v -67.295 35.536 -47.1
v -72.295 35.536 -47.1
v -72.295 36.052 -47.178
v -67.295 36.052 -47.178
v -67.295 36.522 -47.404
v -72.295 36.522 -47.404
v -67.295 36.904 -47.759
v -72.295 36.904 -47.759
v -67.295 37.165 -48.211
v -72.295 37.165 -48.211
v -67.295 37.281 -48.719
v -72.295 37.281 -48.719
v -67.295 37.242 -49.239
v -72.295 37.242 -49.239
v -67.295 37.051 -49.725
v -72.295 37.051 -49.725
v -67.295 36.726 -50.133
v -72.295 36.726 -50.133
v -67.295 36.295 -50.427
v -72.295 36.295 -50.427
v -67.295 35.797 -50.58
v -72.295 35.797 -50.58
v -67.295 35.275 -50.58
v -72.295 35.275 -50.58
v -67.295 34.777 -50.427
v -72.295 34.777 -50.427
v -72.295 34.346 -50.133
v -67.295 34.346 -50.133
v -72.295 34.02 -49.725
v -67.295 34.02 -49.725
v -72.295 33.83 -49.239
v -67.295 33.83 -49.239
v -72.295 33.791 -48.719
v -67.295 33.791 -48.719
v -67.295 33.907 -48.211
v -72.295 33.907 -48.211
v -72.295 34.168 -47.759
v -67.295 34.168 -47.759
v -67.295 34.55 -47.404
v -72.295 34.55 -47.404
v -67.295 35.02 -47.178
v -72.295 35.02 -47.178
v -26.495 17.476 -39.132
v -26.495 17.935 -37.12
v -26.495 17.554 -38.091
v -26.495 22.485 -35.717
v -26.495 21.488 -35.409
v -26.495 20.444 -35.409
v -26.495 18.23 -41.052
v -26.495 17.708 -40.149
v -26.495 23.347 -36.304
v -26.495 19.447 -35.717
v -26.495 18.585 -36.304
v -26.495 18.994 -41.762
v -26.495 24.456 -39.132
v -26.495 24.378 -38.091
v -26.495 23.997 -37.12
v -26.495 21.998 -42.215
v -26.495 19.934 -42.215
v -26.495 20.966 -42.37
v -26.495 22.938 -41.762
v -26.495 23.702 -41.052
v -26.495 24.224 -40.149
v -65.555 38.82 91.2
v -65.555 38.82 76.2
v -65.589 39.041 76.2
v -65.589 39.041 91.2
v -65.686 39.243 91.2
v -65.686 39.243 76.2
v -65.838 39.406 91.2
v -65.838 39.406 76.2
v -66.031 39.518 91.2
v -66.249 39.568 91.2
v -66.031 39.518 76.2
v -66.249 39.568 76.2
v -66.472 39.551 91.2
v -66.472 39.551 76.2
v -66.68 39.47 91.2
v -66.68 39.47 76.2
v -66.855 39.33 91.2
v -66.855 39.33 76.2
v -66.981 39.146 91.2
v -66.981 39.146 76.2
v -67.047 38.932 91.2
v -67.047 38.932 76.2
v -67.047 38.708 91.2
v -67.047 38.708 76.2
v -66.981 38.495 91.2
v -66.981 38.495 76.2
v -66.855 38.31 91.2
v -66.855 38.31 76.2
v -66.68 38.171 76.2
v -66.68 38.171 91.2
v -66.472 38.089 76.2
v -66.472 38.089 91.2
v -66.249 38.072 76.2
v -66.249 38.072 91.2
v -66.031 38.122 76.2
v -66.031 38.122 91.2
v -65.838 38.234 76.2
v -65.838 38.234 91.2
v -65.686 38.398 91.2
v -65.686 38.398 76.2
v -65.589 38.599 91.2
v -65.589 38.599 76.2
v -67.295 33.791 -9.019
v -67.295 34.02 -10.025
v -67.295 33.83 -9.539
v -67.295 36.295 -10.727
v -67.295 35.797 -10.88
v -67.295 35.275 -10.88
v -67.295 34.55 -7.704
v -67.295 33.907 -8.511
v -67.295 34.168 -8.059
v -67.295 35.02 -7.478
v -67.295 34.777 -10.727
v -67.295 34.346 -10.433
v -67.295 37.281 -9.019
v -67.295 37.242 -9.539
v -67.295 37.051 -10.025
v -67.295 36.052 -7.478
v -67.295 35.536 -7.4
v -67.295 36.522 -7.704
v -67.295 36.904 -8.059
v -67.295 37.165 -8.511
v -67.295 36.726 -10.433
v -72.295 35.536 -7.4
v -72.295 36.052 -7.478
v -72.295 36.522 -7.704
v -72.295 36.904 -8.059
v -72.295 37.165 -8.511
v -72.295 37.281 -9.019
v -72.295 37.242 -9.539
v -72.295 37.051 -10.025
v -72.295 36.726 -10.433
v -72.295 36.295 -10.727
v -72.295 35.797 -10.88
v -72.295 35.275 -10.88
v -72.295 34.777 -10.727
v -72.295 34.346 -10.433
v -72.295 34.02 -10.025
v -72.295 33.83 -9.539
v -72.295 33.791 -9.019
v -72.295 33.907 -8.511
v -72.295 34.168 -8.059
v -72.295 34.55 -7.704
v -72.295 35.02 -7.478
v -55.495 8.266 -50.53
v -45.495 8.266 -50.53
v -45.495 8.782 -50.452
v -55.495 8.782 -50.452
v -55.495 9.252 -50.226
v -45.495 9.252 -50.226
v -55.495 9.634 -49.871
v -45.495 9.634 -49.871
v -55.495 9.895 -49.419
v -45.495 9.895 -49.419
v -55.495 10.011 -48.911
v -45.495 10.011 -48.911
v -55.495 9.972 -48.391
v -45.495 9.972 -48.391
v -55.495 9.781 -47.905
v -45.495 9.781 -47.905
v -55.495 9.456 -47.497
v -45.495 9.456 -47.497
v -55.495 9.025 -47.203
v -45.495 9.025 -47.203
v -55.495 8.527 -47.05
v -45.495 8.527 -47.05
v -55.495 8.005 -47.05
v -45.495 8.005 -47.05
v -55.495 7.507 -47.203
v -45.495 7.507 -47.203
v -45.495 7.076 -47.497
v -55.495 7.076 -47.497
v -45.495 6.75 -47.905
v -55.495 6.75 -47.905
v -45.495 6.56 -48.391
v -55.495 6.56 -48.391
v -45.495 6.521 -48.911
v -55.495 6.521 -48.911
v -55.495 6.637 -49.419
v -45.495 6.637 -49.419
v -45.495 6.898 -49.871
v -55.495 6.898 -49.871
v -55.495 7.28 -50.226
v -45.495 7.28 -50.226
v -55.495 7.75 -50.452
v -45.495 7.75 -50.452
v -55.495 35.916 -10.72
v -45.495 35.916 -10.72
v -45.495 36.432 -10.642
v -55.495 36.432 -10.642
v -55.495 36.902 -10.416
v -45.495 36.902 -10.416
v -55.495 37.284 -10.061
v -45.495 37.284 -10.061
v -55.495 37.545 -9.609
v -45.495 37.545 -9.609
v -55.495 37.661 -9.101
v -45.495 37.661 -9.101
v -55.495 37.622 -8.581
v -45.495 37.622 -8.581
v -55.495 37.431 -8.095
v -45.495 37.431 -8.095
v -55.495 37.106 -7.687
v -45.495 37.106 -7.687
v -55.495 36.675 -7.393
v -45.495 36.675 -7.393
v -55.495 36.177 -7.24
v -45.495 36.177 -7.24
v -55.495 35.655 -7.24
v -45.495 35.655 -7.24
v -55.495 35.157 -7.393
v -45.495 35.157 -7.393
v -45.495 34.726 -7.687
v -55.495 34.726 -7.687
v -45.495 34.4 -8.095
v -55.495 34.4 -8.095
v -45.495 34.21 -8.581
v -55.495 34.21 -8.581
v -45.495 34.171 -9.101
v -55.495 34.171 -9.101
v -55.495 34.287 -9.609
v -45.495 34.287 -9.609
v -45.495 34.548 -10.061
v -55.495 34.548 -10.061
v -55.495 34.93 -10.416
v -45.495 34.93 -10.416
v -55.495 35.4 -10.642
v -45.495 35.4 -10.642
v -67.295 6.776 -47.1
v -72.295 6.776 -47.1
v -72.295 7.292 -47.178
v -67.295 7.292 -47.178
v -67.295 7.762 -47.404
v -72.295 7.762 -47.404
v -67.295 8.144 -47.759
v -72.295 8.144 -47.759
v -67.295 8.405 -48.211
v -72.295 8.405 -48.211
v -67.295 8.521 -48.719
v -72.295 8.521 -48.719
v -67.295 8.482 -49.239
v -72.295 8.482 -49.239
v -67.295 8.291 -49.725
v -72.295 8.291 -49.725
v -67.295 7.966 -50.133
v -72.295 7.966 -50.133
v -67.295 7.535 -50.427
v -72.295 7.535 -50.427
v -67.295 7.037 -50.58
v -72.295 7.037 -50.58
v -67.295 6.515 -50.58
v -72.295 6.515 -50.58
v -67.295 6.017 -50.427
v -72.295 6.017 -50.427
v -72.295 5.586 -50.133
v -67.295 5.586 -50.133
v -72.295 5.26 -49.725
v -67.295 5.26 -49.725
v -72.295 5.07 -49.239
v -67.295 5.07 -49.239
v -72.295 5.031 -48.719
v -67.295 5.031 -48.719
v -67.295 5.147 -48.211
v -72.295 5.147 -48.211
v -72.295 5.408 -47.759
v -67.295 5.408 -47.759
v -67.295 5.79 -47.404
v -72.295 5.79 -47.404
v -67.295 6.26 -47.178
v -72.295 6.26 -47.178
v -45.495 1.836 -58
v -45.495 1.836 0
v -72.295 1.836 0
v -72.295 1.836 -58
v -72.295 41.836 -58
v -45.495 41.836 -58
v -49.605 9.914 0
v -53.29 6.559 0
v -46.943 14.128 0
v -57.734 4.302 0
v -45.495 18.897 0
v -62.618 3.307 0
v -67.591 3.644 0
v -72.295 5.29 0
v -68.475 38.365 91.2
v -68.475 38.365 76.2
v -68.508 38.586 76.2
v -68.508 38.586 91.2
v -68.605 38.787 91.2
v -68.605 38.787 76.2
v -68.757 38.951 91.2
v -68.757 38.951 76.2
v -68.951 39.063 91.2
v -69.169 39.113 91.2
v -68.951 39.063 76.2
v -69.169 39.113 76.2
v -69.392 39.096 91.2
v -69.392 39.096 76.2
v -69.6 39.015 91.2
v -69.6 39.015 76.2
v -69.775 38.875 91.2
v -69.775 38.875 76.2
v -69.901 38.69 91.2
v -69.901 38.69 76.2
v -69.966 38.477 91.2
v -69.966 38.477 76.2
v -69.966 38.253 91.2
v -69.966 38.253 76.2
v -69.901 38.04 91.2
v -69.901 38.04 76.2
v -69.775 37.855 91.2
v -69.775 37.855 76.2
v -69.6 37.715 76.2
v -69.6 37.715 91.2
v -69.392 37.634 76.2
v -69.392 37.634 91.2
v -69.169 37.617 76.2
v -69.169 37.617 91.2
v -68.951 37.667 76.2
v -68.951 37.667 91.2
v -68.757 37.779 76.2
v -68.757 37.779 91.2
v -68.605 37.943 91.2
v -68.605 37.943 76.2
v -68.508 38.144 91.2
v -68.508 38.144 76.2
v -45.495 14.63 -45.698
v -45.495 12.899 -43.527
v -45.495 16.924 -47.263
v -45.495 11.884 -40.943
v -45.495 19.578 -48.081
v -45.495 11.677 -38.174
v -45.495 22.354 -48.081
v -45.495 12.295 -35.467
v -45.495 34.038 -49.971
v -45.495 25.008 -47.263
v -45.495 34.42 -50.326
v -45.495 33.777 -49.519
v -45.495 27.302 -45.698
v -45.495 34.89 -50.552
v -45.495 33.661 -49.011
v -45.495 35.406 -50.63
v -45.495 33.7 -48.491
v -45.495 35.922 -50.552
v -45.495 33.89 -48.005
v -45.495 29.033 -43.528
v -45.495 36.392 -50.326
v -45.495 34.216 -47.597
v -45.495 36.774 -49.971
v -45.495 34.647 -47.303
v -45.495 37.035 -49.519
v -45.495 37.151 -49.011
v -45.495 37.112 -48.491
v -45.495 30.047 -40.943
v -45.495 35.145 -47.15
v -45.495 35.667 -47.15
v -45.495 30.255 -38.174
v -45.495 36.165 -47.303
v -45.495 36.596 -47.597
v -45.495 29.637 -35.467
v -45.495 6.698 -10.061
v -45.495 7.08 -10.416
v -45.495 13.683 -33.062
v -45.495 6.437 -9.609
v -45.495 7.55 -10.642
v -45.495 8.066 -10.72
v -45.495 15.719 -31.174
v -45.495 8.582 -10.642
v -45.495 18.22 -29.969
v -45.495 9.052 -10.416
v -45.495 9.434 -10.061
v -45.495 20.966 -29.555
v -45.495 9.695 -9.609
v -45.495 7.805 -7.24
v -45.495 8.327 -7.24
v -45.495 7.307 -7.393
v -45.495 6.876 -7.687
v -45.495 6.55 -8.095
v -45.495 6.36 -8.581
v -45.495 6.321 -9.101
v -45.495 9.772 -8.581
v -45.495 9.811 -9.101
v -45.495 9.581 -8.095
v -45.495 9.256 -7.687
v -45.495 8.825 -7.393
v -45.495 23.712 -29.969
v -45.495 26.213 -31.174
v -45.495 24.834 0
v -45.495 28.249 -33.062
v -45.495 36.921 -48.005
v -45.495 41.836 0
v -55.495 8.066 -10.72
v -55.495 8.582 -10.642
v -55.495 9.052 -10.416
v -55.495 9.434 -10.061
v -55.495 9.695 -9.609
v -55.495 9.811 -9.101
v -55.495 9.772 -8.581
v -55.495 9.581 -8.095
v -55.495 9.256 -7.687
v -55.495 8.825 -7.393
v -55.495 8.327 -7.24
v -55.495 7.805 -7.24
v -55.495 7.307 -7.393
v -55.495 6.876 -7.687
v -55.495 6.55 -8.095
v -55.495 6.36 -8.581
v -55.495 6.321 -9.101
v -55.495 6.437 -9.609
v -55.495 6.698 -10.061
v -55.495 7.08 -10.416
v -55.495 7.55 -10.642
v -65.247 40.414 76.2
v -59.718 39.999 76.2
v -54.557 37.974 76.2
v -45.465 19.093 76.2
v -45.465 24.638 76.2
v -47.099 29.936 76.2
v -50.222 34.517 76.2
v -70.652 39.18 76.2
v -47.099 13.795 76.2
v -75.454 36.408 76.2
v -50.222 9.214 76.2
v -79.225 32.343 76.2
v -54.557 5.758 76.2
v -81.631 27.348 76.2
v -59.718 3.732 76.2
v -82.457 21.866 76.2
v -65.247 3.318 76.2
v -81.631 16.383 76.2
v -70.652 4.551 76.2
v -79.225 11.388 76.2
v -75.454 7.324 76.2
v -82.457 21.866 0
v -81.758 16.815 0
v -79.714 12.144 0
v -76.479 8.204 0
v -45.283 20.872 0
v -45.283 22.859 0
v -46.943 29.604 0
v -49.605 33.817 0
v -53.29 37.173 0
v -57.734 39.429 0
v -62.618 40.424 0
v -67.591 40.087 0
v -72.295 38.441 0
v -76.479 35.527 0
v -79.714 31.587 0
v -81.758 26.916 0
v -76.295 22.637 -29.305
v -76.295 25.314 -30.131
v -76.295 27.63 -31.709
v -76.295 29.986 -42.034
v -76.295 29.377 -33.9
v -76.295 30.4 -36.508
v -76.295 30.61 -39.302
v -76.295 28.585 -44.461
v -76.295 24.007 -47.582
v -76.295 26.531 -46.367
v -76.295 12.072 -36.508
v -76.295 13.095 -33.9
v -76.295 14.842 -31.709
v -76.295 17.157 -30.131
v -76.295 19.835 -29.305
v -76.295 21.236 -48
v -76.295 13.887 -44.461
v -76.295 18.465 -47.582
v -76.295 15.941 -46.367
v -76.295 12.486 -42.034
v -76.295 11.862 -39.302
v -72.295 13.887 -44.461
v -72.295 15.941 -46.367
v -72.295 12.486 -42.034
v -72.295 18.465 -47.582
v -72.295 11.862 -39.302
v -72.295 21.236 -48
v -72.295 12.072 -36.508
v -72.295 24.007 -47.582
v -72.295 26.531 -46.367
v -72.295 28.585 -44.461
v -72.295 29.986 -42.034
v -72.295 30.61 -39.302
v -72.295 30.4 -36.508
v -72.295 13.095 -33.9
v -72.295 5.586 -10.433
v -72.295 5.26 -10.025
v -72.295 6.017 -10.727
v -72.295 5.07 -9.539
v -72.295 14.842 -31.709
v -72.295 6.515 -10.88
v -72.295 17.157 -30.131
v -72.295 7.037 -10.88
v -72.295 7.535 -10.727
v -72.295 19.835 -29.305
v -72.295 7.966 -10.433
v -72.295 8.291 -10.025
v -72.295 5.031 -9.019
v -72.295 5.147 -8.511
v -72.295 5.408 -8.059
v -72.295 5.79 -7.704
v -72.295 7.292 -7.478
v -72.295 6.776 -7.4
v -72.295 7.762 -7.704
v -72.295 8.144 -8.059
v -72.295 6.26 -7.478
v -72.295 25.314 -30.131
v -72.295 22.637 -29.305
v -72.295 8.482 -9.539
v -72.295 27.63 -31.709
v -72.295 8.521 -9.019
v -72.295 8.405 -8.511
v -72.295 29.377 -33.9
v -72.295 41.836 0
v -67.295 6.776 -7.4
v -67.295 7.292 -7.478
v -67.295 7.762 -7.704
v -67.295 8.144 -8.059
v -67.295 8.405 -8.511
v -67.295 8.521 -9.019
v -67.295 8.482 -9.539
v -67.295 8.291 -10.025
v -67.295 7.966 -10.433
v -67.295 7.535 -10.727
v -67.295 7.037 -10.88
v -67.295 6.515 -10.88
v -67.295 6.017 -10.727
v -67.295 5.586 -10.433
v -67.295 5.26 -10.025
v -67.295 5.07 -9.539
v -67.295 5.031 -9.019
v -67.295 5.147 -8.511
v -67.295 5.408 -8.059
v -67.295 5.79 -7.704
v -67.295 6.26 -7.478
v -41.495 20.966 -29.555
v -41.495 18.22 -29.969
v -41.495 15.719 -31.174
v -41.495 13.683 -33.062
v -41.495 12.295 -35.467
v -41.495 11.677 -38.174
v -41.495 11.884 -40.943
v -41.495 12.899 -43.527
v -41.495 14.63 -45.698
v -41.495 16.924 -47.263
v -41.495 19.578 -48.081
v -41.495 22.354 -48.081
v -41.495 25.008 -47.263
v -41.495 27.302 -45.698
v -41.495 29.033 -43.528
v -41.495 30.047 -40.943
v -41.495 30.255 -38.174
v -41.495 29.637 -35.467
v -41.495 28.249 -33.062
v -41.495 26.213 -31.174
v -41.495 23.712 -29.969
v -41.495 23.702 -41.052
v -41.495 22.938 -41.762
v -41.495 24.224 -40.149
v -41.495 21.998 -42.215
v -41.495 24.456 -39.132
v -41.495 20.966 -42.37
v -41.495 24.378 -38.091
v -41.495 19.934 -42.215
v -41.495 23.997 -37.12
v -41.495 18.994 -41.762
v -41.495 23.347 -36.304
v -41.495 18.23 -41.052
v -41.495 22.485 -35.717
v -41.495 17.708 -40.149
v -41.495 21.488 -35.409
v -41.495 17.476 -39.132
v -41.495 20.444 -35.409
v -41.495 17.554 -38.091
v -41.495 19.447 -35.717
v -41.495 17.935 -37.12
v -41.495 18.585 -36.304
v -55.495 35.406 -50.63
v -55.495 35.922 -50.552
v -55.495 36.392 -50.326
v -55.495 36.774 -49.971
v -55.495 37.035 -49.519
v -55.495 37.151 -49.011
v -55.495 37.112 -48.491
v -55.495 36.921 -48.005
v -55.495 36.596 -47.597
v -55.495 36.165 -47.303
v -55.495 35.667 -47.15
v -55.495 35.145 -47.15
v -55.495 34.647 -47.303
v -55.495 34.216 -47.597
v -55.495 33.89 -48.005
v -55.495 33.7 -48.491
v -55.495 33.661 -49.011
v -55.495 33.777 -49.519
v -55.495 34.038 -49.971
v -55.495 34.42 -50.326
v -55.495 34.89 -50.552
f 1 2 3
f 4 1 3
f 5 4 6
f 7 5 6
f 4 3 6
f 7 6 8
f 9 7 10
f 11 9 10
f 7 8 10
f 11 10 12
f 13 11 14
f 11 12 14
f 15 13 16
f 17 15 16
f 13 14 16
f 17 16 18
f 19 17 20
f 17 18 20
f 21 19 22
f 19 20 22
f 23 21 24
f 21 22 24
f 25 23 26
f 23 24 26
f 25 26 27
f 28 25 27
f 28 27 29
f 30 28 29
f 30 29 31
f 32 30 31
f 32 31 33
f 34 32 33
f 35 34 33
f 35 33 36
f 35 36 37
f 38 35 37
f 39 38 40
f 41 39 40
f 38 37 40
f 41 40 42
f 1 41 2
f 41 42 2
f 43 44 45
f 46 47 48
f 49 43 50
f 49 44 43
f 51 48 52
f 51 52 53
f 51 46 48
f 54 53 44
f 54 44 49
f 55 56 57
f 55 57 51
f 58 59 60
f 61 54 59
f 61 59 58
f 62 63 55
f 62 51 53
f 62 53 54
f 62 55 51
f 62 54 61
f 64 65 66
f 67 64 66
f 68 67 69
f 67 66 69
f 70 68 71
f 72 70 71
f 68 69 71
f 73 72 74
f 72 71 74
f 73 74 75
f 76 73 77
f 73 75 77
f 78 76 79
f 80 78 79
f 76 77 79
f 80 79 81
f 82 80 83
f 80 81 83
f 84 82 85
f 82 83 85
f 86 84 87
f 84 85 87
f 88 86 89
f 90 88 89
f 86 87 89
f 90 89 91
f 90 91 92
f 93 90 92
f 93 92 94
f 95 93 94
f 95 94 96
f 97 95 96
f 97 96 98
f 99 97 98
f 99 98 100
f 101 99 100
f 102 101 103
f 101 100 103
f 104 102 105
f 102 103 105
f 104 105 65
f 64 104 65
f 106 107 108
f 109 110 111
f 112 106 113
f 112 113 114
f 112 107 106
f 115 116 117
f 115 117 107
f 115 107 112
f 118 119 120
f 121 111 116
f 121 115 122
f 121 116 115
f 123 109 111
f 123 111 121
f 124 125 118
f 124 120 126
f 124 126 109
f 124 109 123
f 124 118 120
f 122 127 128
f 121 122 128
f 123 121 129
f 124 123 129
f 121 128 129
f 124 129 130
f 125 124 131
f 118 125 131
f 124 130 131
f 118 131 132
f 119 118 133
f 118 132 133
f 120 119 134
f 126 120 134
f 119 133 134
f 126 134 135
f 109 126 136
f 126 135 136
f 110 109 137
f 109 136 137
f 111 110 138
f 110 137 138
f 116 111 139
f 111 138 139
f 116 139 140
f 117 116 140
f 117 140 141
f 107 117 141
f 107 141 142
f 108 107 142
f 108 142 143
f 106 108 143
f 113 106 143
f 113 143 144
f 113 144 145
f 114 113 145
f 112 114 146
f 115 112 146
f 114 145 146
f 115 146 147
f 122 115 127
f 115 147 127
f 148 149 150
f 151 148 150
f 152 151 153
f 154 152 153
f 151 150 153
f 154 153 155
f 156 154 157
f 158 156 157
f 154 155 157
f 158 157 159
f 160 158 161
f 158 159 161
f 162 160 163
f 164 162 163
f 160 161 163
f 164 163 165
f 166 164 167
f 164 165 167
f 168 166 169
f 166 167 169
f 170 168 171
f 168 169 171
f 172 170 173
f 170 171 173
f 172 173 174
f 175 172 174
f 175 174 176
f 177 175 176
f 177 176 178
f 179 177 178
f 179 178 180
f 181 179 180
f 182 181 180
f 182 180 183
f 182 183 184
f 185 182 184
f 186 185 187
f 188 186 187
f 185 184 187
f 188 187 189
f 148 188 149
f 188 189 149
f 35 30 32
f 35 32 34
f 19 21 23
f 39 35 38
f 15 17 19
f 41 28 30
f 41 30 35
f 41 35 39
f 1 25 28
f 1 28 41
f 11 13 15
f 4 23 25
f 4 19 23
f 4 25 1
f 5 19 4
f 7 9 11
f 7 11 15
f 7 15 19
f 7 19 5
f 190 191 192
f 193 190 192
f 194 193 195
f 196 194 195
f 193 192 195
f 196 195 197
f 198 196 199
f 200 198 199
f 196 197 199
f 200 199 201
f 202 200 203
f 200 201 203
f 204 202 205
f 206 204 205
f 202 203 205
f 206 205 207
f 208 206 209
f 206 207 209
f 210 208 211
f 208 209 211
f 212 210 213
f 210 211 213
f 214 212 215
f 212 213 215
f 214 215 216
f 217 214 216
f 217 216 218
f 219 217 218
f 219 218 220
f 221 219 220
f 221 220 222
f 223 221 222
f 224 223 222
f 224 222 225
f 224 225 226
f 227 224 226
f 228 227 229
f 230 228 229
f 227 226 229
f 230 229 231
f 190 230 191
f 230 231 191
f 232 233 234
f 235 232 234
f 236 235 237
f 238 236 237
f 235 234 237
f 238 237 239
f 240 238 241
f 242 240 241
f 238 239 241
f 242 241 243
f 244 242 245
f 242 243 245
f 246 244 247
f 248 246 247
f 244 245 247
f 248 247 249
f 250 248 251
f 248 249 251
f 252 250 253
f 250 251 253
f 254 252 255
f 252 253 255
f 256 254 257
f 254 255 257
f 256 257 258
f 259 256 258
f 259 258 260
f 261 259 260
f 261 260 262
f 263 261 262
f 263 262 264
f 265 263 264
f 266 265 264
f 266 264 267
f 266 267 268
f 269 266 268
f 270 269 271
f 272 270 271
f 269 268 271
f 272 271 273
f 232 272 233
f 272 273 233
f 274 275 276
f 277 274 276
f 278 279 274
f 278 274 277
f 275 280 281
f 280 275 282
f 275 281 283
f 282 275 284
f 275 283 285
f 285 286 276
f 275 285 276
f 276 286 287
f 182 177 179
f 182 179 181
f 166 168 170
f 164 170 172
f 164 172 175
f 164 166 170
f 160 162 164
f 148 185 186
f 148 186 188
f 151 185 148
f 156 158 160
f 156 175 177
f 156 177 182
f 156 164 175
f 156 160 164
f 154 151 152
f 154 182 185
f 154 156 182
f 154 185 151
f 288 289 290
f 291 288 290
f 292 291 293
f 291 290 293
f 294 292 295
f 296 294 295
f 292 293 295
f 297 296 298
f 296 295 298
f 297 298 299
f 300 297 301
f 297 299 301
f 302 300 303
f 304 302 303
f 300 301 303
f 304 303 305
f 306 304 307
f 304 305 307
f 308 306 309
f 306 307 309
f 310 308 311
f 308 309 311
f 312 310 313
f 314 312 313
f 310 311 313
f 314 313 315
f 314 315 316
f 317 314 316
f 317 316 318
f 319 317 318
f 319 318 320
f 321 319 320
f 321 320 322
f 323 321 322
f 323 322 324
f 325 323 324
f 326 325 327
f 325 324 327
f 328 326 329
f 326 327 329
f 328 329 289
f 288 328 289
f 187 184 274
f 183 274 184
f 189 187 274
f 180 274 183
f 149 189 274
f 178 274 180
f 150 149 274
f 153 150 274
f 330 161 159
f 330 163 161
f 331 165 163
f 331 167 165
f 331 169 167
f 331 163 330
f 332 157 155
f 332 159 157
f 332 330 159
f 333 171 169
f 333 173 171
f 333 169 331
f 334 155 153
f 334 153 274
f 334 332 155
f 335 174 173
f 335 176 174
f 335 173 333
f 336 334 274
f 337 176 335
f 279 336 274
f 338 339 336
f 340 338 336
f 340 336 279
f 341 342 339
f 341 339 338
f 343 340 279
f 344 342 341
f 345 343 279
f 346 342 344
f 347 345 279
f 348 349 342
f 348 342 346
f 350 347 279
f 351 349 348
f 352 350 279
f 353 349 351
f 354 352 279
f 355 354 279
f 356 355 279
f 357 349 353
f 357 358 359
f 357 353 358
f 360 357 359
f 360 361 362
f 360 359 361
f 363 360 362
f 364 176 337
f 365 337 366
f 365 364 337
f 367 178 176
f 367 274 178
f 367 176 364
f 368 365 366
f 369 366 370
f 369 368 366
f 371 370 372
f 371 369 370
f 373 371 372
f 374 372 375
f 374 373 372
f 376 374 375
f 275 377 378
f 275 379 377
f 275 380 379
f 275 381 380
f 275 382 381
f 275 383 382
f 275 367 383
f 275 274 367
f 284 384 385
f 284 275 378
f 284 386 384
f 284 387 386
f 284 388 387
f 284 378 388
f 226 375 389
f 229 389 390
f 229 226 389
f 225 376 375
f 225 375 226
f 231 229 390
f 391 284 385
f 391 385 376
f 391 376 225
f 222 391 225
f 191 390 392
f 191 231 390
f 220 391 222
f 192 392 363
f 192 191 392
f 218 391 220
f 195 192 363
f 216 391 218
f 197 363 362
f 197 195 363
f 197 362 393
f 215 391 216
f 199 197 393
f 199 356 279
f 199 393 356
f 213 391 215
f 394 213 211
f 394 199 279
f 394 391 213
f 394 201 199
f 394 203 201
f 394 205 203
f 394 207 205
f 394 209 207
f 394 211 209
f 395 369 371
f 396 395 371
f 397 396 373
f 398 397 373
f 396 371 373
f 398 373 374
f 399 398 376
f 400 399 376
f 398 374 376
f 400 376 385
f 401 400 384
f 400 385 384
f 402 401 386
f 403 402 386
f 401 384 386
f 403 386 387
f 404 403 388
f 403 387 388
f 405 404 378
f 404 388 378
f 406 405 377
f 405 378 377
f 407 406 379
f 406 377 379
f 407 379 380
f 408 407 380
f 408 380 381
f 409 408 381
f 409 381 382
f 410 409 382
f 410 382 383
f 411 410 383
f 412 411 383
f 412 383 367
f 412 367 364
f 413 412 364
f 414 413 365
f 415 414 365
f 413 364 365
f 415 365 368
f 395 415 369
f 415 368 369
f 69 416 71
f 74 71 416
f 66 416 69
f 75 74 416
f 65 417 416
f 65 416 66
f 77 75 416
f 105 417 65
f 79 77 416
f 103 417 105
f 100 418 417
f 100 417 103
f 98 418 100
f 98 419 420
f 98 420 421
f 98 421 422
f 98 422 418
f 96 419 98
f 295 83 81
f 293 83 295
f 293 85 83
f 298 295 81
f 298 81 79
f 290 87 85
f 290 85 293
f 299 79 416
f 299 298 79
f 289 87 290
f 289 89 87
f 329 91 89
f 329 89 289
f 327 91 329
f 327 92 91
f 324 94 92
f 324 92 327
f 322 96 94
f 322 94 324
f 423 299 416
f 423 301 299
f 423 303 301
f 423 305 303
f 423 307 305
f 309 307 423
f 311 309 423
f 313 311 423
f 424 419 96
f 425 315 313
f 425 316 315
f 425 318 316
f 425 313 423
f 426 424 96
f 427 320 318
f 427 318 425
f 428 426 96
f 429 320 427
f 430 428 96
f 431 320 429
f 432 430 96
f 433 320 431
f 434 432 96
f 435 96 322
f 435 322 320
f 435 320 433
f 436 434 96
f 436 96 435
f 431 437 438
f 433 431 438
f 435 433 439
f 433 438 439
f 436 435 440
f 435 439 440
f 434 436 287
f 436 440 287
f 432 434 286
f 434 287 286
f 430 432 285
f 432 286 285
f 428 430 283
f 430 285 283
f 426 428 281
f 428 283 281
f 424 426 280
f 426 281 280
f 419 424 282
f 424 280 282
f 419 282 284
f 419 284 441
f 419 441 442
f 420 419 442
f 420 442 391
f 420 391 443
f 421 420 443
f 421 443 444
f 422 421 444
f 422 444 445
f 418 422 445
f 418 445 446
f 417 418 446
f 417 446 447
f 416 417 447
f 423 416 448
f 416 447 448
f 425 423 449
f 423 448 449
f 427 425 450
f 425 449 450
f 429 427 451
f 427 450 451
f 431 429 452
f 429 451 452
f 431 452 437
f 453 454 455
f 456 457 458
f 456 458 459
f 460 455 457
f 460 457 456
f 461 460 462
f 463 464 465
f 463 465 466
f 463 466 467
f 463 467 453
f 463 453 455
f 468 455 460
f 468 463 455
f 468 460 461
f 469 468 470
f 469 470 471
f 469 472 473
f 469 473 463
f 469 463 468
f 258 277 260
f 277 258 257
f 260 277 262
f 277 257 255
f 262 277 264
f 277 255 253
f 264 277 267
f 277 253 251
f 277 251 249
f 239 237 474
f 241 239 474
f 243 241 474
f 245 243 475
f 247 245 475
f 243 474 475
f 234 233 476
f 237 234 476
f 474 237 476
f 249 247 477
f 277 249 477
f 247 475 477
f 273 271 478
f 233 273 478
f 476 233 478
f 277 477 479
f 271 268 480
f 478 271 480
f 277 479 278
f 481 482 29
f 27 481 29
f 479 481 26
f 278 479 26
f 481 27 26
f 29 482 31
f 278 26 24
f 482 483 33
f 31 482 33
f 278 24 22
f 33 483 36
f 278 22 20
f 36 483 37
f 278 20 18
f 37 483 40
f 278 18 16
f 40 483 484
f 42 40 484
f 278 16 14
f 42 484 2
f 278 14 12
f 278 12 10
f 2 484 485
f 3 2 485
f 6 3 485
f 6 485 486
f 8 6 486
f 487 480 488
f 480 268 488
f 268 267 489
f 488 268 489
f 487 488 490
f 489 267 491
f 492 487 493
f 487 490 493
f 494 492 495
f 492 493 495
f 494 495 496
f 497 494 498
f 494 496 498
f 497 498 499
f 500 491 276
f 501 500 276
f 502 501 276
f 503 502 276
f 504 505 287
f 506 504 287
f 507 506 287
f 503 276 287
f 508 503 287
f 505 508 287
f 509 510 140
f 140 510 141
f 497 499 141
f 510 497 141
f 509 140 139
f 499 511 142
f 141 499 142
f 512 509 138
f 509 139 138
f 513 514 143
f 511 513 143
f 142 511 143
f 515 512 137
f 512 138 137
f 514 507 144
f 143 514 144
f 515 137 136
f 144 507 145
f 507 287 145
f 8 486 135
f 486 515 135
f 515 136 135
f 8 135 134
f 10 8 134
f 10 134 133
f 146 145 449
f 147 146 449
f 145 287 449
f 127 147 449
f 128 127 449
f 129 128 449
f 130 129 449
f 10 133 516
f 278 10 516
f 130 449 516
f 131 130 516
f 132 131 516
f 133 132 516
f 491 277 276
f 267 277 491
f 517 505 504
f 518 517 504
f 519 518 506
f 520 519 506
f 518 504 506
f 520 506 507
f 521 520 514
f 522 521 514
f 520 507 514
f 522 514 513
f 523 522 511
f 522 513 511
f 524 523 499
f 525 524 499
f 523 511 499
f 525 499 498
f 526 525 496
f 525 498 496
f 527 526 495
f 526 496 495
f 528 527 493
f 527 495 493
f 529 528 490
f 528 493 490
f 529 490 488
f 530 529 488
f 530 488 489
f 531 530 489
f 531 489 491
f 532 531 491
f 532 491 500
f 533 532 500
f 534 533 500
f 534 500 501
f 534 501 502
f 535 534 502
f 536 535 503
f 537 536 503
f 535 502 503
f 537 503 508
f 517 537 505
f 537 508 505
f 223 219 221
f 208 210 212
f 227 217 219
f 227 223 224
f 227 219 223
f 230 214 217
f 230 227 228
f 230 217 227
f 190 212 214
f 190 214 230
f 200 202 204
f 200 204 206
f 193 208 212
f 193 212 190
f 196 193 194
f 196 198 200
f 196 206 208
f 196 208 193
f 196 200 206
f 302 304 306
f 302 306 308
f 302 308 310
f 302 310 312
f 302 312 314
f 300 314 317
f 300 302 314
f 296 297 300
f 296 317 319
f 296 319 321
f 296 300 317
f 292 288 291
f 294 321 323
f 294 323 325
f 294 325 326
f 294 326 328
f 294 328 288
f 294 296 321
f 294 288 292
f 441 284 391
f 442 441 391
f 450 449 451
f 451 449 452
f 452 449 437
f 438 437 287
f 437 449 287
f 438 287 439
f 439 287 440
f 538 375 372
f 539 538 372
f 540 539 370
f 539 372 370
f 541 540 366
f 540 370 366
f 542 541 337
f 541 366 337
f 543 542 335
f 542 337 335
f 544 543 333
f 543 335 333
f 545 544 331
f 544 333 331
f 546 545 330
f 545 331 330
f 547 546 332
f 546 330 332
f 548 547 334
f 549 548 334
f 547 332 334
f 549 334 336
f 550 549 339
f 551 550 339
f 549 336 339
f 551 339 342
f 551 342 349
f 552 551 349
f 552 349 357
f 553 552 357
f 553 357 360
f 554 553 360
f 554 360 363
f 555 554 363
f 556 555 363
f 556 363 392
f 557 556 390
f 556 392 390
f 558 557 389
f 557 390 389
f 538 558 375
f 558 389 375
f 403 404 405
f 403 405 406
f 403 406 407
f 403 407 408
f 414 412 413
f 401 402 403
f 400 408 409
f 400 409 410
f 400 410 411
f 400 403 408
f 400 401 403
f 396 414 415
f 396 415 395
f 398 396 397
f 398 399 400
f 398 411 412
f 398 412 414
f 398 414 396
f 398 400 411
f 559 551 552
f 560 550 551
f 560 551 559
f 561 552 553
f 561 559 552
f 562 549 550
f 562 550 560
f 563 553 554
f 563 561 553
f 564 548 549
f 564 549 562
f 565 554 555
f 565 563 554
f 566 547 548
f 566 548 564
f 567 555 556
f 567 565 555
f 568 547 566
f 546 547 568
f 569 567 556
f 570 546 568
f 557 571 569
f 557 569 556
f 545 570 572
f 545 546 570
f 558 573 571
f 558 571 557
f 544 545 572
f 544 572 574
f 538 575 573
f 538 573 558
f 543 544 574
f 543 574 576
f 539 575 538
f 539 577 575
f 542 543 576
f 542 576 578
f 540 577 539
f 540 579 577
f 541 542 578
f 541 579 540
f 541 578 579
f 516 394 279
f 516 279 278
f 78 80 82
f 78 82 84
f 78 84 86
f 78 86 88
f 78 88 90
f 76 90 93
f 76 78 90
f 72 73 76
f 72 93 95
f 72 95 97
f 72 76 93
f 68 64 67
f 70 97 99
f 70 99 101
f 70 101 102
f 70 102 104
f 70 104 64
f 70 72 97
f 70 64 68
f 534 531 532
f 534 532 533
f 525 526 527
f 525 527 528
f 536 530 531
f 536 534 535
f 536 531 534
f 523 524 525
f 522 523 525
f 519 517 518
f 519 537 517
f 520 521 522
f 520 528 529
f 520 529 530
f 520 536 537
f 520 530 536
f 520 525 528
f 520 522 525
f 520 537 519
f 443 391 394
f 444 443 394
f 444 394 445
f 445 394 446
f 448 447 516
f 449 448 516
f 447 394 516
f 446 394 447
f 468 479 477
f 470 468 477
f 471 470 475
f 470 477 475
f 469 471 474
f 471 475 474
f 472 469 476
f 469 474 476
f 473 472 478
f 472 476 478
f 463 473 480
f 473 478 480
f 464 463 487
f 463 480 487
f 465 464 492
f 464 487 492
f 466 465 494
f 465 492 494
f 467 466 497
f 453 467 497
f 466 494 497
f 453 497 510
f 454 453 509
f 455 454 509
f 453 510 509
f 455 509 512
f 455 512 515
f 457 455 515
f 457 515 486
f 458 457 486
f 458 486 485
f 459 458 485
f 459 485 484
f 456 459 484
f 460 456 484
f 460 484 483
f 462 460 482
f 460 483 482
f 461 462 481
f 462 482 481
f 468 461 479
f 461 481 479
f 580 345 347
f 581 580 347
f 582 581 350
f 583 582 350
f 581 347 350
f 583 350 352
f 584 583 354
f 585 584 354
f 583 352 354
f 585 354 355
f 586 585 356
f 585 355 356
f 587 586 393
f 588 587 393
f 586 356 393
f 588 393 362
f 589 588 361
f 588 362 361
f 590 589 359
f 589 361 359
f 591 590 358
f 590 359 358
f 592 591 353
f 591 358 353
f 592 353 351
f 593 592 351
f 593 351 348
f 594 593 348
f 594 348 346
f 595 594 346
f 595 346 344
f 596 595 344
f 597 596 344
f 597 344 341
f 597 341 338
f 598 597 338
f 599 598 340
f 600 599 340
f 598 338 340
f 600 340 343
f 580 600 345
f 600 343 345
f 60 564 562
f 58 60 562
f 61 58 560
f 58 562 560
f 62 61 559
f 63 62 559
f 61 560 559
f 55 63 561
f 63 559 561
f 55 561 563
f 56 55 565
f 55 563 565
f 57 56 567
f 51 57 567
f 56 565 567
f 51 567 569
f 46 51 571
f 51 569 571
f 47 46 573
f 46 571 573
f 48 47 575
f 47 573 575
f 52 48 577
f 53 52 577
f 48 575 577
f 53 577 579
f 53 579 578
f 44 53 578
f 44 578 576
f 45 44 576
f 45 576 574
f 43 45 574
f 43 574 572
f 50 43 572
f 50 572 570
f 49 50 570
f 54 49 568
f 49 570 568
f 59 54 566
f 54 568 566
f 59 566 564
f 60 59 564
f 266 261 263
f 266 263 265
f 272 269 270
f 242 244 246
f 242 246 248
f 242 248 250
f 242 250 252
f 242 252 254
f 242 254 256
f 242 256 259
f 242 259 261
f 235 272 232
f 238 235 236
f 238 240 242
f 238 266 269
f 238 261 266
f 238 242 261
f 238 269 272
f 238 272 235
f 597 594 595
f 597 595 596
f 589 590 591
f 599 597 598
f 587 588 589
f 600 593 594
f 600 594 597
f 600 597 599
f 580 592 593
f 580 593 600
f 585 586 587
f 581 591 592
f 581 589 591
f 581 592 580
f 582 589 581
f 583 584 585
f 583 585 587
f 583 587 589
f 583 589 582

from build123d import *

# Parameters (mm, degrees)
SKETCH4_R           = 18.6
BOSS_EXTRUDE3_DEPTH = 76.2
SKETCH5_R           = 0.75
BOSS_EXTRUDE4_DEPTH = 15
SKETCH6_R           = 0.75
BOSS_EXTRUDE5_DEPTH = 15
SKETCH7_W           = 26.8
SKETCH7_H           = 40
BOSS_EXTRUDE6_DEPTH = 58
SKETCH8_R           = 1.75
CUT_EXTRUDE1_DEPTH  = 5
SKETCH9_R           = 1.75
CUT_EXTRUDE2_DEPTH  = 5
SKETCH10_R          = 1.75
CUT_EXTRUDE3_DEPTH  = 5
SKETCH11_R          = 1.75
CUT_EXTRUDE4_DEPTH  = 5
SKETCH12_R          = 9.4
BOSS_EXTRUDE7_DEPTH = 4
SKETCH13_R          = 1.75
CUT_EXTRUDE5_DEPTH  = 10
SKETCH14_R          = 1.75
CUT_EXTRUDE6_DEPTH  = 10
SKETCH17_R          = 1.75
CUT_EXTRUDE7_DEPTH  = 10
SKETCH18_R          = 1.75
CUT_EXTRUDE8_DEPTH  = 10
SKETCH19_R          = 9.315
BOSS_EXTRUDE8_DEPTH = 4
SKETCH21_R          = 3.5
BOSS_EXTRUDE9_DEPTH = 15


with BuildPart() as part:
    # Sketch4 → Boss-Extrude3 (new body)
    with BuildSketch(Plane.XY):
        with Locations(Location((-63.856856352, 21.865677116, 0), (0, 0, 180))):
            Circle(SKETCH4_R)
    extrude(amount=BOSS_EXTRUDE3_DEPTH)

    # Sketch5 → Boss-Extrude4 (add)
    with BuildSketch(Plane.XY.offset(76.2)):
        with Locations((-66.305296551, 38.820097555)):
            Circle(SKETCH5_R)
    extrude(amount=BOSS_EXTRUDE4_DEPTH)

    # Sketch6 → Boss-Extrude5 (add)
    with BuildSketch(Plane.XY.offset(76.2)):
        with Locations((-69.224873833, 38.364991381)):
            Circle(SKETCH6_R)
    extrude(amount=BOSS_EXTRUDE5_DEPTH)

    # Sketch7 → Boss-Extrude6 (add)
    with BuildSketch(Plane(origin=(0, 0, 0), x_dir=(-1, 0, 0), z_dir=(0, 0, -1))):
        with Locations((58.895304338, 21.83595021)):
            Rectangle(SKETCH7_W, SKETCH7_H)
    extrude(amount=BOSS_EXTRUDE6_DEPTH)

    # Sketch8 → Cut-Extrude1 (cut)
    with BuildSketch(Plane.ZY.offset(72.295304338)):
        with Locations((-48.85, 35.53595021)):
            Circle(SKETCH8_R)
    extrude(amount=-CUT_EXTRUDE1_DEPTH, mode=Mode.SUBTRACT)

    # Sketch9 → Cut-Extrude2 (cut)
    with BuildSketch(Plane.ZY.offset(72.295304338)):
        with Locations((-9.15, 35.53595021)):
            Circle(SKETCH9_R)
    extrude(amount=-CUT_EXTRUDE2_DEPTH, mode=Mode.SUBTRACT)

    # Sketch10 → Cut-Extrude3 (cut)
    with BuildSketch(Plane.ZY.offset(72.295304338)):
        with Locations((-48.85, 6.77595021)):
            Circle(SKETCH10_R)
    extrude(amount=-CUT_EXTRUDE3_DEPTH, mode=Mode.SUBTRACT)

    # Sketch11 → Cut-Extrude4 (cut)
    with BuildSketch(Plane.ZY.offset(72.295304338)):
        with Locations((-9.15, 6.77595021)):
            Circle(SKETCH11_R)
    extrude(amount=-CUT_EXTRUDE4_DEPTH, mode=Mode.SUBTRACT)

    # Sketch12 → Boss-Extrude7 (add)
    with BuildSketch(Plane.ZY.offset(72.295304338)):
        with Locations(Location((-38.6, 21.23595021, 0), (0, 0, 180))):
            Circle(SKETCH12_R)
    extrude(amount=BOSS_EXTRUDE7_DEPTH)

    # Sketch13 → Cut-Extrude5 (cut)
    with BuildSketch(Plane(origin=(-45.495304338, 0, 0), x_dir=(0, 0, -1), z_dir=(1, 0, 0))):
        with Locations((8.97, 35.91595021)):
            Circle(SKETCH13_R)
    extrude(amount=-CUT_EXTRUDE5_DEPTH, mode=Mode.SUBTRACT)

    # Sketch14 → Cut-Extrude6 (cut)
    with BuildSketch(Plane(origin=(-45.495304338, 0, 0), x_dir=(0, 0, -1), z_dir=(1, 0, 0))):
        with Locations((8.97, 8.06595021)):
            Circle(SKETCH14_R)
    extrude(amount=-CUT_EXTRUDE6_DEPTH, mode=Mode.SUBTRACT)

    # Sketch17 → Cut-Extrude7 (cut)
    with BuildSketch(Plane(origin=(-45.495304338, 0, 0), x_dir=(0, 0, -1), z_dir=(1, 0, 0))):
        with Locations((48.78, 8.26595021)):
            Circle(SKETCH17_R)
    extrude(amount=-CUT_EXTRUDE7_DEPTH, mode=Mode.SUBTRACT)

    # Sketch18 → Cut-Extrude8 (cut)
    with BuildSketch(Plane(origin=(-45.495304338, 0, 0), x_dir=(0, 0, -1), z_dir=(1, 0, 0))):
        with Locations((48.88, 35.40595021)):
            Circle(SKETCH18_R)
    extrude(amount=-CUT_EXTRUDE8_DEPTH, mode=Mode.SUBTRACT)

    # Sketch19 → Boss-Extrude8 (add)
    with BuildSketch(Plane(origin=(-45.495304338, 0, 0), x_dir=(0, 0, -1), z_dir=(1, 0, 0))):
        with Locations(Location((38.87, 20.96595021, 0), (0, 0, 180))):
            Circle(SKETCH19_R)
    extrude(amount=BOSS_EXTRUDE8_DEPTH)

    # Sketch21 → Boss-Extrude9 (add)
    with BuildSketch(Plane(origin=(-41.495304338, 0, 0), x_dir=(0, 0, -1), z_dir=(1, 0, 0))):
        with Locations((38.87, 20.96595021)):
            Circle(SKETCH21_R)
    extrude(amount=BOSS_EXTRUDE9_DEPTH)


solid = part.part
